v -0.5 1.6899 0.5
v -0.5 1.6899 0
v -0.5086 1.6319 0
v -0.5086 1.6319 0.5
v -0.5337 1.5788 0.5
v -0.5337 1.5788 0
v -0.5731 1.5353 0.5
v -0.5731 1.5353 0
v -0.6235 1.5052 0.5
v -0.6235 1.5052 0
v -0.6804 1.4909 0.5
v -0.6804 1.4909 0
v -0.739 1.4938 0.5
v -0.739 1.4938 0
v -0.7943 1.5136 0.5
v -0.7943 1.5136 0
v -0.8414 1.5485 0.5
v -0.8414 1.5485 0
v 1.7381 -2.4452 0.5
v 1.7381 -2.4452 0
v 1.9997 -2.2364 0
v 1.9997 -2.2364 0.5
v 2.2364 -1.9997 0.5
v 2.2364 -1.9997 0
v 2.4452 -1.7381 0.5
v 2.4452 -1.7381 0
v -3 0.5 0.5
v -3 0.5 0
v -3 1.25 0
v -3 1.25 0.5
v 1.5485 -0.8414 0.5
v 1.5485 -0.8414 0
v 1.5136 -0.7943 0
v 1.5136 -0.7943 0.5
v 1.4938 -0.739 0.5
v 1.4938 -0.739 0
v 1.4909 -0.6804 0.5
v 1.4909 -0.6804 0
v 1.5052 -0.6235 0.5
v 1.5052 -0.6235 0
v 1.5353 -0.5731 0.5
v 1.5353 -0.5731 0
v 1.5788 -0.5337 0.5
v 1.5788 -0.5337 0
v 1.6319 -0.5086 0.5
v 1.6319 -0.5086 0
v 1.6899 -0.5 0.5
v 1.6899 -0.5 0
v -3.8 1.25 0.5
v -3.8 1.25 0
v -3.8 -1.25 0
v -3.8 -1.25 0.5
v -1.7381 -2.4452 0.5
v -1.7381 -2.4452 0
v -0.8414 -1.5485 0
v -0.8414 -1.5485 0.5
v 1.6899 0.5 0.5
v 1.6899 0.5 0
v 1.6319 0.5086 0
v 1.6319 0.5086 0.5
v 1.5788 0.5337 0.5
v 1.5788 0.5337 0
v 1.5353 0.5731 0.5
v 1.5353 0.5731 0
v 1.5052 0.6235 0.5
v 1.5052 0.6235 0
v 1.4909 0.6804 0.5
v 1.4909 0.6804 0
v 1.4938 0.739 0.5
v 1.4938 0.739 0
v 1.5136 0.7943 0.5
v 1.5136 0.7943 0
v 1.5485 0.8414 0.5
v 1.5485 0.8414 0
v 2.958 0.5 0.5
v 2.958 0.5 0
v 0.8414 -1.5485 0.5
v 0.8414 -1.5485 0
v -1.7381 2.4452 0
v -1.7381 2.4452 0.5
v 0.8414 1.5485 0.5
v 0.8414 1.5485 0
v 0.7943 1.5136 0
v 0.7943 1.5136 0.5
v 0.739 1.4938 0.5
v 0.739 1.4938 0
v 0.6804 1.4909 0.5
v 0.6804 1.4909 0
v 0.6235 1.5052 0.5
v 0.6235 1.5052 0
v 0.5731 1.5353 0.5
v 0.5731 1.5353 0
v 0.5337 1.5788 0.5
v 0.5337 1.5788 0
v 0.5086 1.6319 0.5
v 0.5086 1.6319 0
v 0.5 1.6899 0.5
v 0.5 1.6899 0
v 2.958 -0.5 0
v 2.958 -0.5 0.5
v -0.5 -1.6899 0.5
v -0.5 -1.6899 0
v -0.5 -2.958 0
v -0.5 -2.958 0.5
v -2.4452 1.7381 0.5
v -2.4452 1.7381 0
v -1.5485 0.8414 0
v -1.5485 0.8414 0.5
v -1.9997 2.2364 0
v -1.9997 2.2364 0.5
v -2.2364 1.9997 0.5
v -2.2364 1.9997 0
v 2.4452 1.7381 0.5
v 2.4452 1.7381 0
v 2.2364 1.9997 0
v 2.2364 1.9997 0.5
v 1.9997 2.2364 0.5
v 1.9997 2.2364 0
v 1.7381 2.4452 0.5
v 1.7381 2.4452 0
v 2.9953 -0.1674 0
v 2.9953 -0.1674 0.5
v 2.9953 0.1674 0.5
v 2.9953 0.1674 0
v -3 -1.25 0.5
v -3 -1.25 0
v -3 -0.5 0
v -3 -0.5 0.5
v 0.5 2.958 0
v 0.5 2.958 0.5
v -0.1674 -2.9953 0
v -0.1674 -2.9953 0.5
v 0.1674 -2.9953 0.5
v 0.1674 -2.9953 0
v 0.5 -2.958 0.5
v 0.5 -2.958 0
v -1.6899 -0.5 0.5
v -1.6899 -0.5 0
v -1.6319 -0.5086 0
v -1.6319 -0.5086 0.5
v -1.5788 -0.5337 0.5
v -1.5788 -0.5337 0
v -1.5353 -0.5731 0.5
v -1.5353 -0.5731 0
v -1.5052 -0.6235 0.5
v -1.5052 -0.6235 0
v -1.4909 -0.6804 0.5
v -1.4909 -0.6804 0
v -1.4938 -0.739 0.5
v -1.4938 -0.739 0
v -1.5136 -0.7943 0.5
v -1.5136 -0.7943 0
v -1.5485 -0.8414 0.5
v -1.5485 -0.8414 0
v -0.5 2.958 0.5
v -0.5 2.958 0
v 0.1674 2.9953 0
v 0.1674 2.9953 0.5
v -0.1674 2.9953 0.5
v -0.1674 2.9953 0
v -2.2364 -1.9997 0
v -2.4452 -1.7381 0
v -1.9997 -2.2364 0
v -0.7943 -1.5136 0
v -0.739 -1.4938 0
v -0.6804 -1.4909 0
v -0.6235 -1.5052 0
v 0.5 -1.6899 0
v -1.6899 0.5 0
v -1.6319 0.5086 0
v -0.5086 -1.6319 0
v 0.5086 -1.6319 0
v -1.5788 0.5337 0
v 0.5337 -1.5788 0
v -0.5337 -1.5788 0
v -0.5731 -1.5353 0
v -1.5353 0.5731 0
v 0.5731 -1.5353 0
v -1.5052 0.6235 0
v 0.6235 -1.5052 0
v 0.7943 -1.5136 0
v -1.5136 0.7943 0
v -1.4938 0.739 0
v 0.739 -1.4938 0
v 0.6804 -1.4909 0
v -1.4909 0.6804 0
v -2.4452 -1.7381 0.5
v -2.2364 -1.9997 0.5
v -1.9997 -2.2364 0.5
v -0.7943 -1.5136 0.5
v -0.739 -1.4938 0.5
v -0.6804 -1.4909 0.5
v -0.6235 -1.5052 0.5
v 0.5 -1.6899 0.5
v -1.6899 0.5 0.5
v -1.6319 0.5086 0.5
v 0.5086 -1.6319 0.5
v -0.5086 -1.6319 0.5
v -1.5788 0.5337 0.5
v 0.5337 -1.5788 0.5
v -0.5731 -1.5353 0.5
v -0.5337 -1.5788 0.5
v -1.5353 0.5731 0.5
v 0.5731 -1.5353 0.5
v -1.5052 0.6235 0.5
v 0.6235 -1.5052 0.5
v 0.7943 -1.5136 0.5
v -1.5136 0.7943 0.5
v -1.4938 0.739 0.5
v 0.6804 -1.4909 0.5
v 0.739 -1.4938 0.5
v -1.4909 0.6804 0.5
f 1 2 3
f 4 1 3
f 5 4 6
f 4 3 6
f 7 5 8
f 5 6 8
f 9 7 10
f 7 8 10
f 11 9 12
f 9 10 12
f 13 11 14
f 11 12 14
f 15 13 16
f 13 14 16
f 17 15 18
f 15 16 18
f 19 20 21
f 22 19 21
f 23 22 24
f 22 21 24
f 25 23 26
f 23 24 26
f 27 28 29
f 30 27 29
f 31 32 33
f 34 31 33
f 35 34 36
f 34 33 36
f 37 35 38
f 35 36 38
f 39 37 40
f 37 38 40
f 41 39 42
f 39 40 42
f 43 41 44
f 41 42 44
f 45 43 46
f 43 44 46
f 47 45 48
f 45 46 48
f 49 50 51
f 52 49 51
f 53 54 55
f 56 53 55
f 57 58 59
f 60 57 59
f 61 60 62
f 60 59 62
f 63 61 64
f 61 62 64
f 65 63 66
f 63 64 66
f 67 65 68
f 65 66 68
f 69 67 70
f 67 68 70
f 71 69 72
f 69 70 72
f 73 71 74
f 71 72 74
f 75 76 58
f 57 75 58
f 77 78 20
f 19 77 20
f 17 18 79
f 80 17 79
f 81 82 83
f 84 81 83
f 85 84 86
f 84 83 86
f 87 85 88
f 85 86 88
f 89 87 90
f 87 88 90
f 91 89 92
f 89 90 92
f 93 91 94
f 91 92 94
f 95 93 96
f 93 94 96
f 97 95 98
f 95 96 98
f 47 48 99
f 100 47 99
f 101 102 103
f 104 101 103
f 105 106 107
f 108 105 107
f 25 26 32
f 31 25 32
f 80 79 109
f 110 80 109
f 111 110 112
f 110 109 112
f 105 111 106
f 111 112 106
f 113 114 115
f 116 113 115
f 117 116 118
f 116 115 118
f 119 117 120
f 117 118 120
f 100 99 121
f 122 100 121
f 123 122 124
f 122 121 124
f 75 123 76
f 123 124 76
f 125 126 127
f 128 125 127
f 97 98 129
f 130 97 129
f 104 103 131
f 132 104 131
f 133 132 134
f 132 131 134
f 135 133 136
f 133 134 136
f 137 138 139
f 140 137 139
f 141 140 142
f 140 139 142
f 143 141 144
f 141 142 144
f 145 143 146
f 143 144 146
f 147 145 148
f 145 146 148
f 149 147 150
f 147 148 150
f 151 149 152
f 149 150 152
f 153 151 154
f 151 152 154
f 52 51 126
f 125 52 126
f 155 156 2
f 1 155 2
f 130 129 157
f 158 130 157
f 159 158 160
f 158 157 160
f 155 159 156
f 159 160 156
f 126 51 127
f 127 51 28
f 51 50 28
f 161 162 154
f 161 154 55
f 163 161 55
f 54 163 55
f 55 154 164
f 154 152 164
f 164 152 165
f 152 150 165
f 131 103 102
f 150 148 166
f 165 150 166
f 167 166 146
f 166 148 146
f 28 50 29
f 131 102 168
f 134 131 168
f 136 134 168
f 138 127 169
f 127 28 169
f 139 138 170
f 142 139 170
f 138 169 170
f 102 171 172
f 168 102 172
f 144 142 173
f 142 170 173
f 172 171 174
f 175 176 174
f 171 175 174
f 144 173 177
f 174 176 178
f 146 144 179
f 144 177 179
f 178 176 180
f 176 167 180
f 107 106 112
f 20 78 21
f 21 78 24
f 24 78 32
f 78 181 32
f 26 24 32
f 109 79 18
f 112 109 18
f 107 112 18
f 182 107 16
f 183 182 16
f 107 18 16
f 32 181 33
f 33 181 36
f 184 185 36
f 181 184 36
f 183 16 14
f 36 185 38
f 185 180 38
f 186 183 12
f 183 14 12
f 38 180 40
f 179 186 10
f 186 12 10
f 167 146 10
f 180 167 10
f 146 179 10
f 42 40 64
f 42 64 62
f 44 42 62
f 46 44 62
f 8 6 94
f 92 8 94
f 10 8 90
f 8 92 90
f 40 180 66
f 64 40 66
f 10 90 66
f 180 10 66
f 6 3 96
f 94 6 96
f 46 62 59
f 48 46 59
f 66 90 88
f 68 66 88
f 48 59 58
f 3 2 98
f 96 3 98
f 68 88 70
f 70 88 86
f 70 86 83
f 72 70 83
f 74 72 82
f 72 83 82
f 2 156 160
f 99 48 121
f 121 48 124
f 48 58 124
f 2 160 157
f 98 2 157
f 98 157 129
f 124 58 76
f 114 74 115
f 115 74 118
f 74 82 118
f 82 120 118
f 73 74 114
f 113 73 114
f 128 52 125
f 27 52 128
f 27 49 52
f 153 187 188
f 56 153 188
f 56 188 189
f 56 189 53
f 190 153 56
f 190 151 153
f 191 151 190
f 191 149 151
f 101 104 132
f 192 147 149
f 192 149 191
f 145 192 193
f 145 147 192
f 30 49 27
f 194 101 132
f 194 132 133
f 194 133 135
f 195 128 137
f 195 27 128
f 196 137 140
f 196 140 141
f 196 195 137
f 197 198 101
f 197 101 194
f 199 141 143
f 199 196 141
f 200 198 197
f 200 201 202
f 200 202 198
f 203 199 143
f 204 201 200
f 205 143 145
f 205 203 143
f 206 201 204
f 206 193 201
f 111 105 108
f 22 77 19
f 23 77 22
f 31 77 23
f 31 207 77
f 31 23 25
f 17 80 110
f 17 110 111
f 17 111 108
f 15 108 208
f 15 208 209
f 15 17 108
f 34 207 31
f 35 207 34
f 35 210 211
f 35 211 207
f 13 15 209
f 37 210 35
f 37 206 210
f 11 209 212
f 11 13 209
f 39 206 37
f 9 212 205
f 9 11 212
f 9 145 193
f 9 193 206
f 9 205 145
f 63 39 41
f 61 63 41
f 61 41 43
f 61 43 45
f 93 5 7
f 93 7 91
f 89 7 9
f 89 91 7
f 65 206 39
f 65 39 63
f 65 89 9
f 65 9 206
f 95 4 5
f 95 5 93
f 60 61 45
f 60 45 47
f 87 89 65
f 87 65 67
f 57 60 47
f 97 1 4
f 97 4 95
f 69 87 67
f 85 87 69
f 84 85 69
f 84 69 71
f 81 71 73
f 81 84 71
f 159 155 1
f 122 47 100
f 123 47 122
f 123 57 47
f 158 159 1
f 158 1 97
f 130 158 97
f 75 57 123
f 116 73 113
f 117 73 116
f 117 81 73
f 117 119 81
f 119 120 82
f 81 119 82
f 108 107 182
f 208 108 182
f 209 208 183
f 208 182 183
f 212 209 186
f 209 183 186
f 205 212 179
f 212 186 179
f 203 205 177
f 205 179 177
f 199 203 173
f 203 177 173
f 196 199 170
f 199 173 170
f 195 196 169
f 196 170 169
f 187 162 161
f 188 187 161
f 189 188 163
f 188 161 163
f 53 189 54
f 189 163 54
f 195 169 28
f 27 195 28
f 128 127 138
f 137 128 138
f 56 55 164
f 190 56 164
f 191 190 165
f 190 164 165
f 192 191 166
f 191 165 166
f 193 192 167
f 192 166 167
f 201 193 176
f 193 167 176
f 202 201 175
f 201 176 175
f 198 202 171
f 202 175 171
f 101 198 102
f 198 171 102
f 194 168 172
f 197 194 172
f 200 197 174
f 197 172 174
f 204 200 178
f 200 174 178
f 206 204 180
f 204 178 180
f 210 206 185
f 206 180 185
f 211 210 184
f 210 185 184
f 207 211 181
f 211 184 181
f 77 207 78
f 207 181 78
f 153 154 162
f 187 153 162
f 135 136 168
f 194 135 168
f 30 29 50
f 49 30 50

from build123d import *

# Parameters (mm, degrees)
F1_DEPTH = 0.5


with BuildPart() as f1:
    # F0 (on Top) → F1 (new body)
    with BuildSketch(Plane.XY):
        with BuildLine():
            Line((0.5, 1.689949), (0.5, 2.95804))
            ThreePointArc((0.5, 2.95804), (0, 3), (-0.5, 2.95804))
            Line((-0.5, 2.95804), (-0.5, 1.689949))
            ThreePointArc((-0.5, 1.689949), (-0.623463, 1.505174), (-0.841421, 1.548528))
            Line((-0.841421, 1.548528), (-1.738097, 2.445203))
            ThreePointArc((-1.738097, 2.445203), (-2.12132, 2.12132), (-2.445203, 1.738097))
            Line((-2.445203, 1.738097), (-1.548528, 0.841421))
            ThreePointArc((-1.548528, 0.841421), (-1.505174, 0.623463), (-1.689949, 0.5))
            Line((-1.689949, 0.5), (-3, 0.5))
            Line((-3, 0.5), (-3, 1.25))
            Line((-3, 1.25), (-3.8, 1.25))
            Line((-3.8, 1.25), (-3.8, -1.25))
            Line((-3.8, -1.25), (-3, -1.25))
            Line((-3, -1.25), (-3, -0.5))
            Line((-3, -0.5), (-1.689949, -0.5))
            ThreePointArc((-1.689949, -0.5), (-1.505174, -0.623463), (-1.548528, -0.841421))
            Line((-1.548528, -0.841421), (-2.445203, -1.738097))
            ThreePointArc((-2.445203, -1.738097), (-2.12132, -2.12132), (-1.738097, -2.445203))
            Line((-1.738097, -2.445203), (-0.841421, -1.548528))
            ThreePointArc((-0.841421, -1.548528), (-0.623463, -1.505174), (-0.5, -1.689949))
            Line((-0.5, -1.689949), (-0.5, -2.95804))
            ThreePointArc((-0.5, -2.95804), (0, -3), (0.5, -2.95804))
            Line((0.5, -2.95804), (0.5, -1.689949))
            ThreePointArc((0.5, -1.689949), (0.623463, -1.505174), (0.841421, -1.548528))
            Line((0.841421, -1.548528), (1.738097, -2.445203))
            ThreePointArc((1.738097, -2.445203), (2.12132, -2.12132), (2.445203, -1.738097))
            Line((2.445203, -1.738097), (1.548528, -0.841421))
            ThreePointArc((1.548528, -0.841421), (1.505174, -0.623463), (1.689949, -0.5))
            Line((1.689949, -0.5), (2.95804, -0.5))
            ThreePointArc((2.95804, -0.5), (3, 0), (2.95804, 0.5))
            Line((2.95804, 0.5), (1.689949, 0.5))
            ThreePointArc((1.689949, 0.5), (1.505174, 0.623463), (1.548528, 0.841421))
            Line((1.548528, 0.841421), (2.445203, 1.738097))
            ThreePointArc((2.445203, 1.738097), (2.12132, 2.12132), (1.738097, 2.445203))
            Line((1.738097, 2.445203), (0.841421, 1.548528))
            ThreePointArc((0.841421, 1.548528), (0.623463, 1.505174), (0.5, 1.689949))
        make_face()
    extrude(amount=F1_DEPTH)


solid = f1.part
